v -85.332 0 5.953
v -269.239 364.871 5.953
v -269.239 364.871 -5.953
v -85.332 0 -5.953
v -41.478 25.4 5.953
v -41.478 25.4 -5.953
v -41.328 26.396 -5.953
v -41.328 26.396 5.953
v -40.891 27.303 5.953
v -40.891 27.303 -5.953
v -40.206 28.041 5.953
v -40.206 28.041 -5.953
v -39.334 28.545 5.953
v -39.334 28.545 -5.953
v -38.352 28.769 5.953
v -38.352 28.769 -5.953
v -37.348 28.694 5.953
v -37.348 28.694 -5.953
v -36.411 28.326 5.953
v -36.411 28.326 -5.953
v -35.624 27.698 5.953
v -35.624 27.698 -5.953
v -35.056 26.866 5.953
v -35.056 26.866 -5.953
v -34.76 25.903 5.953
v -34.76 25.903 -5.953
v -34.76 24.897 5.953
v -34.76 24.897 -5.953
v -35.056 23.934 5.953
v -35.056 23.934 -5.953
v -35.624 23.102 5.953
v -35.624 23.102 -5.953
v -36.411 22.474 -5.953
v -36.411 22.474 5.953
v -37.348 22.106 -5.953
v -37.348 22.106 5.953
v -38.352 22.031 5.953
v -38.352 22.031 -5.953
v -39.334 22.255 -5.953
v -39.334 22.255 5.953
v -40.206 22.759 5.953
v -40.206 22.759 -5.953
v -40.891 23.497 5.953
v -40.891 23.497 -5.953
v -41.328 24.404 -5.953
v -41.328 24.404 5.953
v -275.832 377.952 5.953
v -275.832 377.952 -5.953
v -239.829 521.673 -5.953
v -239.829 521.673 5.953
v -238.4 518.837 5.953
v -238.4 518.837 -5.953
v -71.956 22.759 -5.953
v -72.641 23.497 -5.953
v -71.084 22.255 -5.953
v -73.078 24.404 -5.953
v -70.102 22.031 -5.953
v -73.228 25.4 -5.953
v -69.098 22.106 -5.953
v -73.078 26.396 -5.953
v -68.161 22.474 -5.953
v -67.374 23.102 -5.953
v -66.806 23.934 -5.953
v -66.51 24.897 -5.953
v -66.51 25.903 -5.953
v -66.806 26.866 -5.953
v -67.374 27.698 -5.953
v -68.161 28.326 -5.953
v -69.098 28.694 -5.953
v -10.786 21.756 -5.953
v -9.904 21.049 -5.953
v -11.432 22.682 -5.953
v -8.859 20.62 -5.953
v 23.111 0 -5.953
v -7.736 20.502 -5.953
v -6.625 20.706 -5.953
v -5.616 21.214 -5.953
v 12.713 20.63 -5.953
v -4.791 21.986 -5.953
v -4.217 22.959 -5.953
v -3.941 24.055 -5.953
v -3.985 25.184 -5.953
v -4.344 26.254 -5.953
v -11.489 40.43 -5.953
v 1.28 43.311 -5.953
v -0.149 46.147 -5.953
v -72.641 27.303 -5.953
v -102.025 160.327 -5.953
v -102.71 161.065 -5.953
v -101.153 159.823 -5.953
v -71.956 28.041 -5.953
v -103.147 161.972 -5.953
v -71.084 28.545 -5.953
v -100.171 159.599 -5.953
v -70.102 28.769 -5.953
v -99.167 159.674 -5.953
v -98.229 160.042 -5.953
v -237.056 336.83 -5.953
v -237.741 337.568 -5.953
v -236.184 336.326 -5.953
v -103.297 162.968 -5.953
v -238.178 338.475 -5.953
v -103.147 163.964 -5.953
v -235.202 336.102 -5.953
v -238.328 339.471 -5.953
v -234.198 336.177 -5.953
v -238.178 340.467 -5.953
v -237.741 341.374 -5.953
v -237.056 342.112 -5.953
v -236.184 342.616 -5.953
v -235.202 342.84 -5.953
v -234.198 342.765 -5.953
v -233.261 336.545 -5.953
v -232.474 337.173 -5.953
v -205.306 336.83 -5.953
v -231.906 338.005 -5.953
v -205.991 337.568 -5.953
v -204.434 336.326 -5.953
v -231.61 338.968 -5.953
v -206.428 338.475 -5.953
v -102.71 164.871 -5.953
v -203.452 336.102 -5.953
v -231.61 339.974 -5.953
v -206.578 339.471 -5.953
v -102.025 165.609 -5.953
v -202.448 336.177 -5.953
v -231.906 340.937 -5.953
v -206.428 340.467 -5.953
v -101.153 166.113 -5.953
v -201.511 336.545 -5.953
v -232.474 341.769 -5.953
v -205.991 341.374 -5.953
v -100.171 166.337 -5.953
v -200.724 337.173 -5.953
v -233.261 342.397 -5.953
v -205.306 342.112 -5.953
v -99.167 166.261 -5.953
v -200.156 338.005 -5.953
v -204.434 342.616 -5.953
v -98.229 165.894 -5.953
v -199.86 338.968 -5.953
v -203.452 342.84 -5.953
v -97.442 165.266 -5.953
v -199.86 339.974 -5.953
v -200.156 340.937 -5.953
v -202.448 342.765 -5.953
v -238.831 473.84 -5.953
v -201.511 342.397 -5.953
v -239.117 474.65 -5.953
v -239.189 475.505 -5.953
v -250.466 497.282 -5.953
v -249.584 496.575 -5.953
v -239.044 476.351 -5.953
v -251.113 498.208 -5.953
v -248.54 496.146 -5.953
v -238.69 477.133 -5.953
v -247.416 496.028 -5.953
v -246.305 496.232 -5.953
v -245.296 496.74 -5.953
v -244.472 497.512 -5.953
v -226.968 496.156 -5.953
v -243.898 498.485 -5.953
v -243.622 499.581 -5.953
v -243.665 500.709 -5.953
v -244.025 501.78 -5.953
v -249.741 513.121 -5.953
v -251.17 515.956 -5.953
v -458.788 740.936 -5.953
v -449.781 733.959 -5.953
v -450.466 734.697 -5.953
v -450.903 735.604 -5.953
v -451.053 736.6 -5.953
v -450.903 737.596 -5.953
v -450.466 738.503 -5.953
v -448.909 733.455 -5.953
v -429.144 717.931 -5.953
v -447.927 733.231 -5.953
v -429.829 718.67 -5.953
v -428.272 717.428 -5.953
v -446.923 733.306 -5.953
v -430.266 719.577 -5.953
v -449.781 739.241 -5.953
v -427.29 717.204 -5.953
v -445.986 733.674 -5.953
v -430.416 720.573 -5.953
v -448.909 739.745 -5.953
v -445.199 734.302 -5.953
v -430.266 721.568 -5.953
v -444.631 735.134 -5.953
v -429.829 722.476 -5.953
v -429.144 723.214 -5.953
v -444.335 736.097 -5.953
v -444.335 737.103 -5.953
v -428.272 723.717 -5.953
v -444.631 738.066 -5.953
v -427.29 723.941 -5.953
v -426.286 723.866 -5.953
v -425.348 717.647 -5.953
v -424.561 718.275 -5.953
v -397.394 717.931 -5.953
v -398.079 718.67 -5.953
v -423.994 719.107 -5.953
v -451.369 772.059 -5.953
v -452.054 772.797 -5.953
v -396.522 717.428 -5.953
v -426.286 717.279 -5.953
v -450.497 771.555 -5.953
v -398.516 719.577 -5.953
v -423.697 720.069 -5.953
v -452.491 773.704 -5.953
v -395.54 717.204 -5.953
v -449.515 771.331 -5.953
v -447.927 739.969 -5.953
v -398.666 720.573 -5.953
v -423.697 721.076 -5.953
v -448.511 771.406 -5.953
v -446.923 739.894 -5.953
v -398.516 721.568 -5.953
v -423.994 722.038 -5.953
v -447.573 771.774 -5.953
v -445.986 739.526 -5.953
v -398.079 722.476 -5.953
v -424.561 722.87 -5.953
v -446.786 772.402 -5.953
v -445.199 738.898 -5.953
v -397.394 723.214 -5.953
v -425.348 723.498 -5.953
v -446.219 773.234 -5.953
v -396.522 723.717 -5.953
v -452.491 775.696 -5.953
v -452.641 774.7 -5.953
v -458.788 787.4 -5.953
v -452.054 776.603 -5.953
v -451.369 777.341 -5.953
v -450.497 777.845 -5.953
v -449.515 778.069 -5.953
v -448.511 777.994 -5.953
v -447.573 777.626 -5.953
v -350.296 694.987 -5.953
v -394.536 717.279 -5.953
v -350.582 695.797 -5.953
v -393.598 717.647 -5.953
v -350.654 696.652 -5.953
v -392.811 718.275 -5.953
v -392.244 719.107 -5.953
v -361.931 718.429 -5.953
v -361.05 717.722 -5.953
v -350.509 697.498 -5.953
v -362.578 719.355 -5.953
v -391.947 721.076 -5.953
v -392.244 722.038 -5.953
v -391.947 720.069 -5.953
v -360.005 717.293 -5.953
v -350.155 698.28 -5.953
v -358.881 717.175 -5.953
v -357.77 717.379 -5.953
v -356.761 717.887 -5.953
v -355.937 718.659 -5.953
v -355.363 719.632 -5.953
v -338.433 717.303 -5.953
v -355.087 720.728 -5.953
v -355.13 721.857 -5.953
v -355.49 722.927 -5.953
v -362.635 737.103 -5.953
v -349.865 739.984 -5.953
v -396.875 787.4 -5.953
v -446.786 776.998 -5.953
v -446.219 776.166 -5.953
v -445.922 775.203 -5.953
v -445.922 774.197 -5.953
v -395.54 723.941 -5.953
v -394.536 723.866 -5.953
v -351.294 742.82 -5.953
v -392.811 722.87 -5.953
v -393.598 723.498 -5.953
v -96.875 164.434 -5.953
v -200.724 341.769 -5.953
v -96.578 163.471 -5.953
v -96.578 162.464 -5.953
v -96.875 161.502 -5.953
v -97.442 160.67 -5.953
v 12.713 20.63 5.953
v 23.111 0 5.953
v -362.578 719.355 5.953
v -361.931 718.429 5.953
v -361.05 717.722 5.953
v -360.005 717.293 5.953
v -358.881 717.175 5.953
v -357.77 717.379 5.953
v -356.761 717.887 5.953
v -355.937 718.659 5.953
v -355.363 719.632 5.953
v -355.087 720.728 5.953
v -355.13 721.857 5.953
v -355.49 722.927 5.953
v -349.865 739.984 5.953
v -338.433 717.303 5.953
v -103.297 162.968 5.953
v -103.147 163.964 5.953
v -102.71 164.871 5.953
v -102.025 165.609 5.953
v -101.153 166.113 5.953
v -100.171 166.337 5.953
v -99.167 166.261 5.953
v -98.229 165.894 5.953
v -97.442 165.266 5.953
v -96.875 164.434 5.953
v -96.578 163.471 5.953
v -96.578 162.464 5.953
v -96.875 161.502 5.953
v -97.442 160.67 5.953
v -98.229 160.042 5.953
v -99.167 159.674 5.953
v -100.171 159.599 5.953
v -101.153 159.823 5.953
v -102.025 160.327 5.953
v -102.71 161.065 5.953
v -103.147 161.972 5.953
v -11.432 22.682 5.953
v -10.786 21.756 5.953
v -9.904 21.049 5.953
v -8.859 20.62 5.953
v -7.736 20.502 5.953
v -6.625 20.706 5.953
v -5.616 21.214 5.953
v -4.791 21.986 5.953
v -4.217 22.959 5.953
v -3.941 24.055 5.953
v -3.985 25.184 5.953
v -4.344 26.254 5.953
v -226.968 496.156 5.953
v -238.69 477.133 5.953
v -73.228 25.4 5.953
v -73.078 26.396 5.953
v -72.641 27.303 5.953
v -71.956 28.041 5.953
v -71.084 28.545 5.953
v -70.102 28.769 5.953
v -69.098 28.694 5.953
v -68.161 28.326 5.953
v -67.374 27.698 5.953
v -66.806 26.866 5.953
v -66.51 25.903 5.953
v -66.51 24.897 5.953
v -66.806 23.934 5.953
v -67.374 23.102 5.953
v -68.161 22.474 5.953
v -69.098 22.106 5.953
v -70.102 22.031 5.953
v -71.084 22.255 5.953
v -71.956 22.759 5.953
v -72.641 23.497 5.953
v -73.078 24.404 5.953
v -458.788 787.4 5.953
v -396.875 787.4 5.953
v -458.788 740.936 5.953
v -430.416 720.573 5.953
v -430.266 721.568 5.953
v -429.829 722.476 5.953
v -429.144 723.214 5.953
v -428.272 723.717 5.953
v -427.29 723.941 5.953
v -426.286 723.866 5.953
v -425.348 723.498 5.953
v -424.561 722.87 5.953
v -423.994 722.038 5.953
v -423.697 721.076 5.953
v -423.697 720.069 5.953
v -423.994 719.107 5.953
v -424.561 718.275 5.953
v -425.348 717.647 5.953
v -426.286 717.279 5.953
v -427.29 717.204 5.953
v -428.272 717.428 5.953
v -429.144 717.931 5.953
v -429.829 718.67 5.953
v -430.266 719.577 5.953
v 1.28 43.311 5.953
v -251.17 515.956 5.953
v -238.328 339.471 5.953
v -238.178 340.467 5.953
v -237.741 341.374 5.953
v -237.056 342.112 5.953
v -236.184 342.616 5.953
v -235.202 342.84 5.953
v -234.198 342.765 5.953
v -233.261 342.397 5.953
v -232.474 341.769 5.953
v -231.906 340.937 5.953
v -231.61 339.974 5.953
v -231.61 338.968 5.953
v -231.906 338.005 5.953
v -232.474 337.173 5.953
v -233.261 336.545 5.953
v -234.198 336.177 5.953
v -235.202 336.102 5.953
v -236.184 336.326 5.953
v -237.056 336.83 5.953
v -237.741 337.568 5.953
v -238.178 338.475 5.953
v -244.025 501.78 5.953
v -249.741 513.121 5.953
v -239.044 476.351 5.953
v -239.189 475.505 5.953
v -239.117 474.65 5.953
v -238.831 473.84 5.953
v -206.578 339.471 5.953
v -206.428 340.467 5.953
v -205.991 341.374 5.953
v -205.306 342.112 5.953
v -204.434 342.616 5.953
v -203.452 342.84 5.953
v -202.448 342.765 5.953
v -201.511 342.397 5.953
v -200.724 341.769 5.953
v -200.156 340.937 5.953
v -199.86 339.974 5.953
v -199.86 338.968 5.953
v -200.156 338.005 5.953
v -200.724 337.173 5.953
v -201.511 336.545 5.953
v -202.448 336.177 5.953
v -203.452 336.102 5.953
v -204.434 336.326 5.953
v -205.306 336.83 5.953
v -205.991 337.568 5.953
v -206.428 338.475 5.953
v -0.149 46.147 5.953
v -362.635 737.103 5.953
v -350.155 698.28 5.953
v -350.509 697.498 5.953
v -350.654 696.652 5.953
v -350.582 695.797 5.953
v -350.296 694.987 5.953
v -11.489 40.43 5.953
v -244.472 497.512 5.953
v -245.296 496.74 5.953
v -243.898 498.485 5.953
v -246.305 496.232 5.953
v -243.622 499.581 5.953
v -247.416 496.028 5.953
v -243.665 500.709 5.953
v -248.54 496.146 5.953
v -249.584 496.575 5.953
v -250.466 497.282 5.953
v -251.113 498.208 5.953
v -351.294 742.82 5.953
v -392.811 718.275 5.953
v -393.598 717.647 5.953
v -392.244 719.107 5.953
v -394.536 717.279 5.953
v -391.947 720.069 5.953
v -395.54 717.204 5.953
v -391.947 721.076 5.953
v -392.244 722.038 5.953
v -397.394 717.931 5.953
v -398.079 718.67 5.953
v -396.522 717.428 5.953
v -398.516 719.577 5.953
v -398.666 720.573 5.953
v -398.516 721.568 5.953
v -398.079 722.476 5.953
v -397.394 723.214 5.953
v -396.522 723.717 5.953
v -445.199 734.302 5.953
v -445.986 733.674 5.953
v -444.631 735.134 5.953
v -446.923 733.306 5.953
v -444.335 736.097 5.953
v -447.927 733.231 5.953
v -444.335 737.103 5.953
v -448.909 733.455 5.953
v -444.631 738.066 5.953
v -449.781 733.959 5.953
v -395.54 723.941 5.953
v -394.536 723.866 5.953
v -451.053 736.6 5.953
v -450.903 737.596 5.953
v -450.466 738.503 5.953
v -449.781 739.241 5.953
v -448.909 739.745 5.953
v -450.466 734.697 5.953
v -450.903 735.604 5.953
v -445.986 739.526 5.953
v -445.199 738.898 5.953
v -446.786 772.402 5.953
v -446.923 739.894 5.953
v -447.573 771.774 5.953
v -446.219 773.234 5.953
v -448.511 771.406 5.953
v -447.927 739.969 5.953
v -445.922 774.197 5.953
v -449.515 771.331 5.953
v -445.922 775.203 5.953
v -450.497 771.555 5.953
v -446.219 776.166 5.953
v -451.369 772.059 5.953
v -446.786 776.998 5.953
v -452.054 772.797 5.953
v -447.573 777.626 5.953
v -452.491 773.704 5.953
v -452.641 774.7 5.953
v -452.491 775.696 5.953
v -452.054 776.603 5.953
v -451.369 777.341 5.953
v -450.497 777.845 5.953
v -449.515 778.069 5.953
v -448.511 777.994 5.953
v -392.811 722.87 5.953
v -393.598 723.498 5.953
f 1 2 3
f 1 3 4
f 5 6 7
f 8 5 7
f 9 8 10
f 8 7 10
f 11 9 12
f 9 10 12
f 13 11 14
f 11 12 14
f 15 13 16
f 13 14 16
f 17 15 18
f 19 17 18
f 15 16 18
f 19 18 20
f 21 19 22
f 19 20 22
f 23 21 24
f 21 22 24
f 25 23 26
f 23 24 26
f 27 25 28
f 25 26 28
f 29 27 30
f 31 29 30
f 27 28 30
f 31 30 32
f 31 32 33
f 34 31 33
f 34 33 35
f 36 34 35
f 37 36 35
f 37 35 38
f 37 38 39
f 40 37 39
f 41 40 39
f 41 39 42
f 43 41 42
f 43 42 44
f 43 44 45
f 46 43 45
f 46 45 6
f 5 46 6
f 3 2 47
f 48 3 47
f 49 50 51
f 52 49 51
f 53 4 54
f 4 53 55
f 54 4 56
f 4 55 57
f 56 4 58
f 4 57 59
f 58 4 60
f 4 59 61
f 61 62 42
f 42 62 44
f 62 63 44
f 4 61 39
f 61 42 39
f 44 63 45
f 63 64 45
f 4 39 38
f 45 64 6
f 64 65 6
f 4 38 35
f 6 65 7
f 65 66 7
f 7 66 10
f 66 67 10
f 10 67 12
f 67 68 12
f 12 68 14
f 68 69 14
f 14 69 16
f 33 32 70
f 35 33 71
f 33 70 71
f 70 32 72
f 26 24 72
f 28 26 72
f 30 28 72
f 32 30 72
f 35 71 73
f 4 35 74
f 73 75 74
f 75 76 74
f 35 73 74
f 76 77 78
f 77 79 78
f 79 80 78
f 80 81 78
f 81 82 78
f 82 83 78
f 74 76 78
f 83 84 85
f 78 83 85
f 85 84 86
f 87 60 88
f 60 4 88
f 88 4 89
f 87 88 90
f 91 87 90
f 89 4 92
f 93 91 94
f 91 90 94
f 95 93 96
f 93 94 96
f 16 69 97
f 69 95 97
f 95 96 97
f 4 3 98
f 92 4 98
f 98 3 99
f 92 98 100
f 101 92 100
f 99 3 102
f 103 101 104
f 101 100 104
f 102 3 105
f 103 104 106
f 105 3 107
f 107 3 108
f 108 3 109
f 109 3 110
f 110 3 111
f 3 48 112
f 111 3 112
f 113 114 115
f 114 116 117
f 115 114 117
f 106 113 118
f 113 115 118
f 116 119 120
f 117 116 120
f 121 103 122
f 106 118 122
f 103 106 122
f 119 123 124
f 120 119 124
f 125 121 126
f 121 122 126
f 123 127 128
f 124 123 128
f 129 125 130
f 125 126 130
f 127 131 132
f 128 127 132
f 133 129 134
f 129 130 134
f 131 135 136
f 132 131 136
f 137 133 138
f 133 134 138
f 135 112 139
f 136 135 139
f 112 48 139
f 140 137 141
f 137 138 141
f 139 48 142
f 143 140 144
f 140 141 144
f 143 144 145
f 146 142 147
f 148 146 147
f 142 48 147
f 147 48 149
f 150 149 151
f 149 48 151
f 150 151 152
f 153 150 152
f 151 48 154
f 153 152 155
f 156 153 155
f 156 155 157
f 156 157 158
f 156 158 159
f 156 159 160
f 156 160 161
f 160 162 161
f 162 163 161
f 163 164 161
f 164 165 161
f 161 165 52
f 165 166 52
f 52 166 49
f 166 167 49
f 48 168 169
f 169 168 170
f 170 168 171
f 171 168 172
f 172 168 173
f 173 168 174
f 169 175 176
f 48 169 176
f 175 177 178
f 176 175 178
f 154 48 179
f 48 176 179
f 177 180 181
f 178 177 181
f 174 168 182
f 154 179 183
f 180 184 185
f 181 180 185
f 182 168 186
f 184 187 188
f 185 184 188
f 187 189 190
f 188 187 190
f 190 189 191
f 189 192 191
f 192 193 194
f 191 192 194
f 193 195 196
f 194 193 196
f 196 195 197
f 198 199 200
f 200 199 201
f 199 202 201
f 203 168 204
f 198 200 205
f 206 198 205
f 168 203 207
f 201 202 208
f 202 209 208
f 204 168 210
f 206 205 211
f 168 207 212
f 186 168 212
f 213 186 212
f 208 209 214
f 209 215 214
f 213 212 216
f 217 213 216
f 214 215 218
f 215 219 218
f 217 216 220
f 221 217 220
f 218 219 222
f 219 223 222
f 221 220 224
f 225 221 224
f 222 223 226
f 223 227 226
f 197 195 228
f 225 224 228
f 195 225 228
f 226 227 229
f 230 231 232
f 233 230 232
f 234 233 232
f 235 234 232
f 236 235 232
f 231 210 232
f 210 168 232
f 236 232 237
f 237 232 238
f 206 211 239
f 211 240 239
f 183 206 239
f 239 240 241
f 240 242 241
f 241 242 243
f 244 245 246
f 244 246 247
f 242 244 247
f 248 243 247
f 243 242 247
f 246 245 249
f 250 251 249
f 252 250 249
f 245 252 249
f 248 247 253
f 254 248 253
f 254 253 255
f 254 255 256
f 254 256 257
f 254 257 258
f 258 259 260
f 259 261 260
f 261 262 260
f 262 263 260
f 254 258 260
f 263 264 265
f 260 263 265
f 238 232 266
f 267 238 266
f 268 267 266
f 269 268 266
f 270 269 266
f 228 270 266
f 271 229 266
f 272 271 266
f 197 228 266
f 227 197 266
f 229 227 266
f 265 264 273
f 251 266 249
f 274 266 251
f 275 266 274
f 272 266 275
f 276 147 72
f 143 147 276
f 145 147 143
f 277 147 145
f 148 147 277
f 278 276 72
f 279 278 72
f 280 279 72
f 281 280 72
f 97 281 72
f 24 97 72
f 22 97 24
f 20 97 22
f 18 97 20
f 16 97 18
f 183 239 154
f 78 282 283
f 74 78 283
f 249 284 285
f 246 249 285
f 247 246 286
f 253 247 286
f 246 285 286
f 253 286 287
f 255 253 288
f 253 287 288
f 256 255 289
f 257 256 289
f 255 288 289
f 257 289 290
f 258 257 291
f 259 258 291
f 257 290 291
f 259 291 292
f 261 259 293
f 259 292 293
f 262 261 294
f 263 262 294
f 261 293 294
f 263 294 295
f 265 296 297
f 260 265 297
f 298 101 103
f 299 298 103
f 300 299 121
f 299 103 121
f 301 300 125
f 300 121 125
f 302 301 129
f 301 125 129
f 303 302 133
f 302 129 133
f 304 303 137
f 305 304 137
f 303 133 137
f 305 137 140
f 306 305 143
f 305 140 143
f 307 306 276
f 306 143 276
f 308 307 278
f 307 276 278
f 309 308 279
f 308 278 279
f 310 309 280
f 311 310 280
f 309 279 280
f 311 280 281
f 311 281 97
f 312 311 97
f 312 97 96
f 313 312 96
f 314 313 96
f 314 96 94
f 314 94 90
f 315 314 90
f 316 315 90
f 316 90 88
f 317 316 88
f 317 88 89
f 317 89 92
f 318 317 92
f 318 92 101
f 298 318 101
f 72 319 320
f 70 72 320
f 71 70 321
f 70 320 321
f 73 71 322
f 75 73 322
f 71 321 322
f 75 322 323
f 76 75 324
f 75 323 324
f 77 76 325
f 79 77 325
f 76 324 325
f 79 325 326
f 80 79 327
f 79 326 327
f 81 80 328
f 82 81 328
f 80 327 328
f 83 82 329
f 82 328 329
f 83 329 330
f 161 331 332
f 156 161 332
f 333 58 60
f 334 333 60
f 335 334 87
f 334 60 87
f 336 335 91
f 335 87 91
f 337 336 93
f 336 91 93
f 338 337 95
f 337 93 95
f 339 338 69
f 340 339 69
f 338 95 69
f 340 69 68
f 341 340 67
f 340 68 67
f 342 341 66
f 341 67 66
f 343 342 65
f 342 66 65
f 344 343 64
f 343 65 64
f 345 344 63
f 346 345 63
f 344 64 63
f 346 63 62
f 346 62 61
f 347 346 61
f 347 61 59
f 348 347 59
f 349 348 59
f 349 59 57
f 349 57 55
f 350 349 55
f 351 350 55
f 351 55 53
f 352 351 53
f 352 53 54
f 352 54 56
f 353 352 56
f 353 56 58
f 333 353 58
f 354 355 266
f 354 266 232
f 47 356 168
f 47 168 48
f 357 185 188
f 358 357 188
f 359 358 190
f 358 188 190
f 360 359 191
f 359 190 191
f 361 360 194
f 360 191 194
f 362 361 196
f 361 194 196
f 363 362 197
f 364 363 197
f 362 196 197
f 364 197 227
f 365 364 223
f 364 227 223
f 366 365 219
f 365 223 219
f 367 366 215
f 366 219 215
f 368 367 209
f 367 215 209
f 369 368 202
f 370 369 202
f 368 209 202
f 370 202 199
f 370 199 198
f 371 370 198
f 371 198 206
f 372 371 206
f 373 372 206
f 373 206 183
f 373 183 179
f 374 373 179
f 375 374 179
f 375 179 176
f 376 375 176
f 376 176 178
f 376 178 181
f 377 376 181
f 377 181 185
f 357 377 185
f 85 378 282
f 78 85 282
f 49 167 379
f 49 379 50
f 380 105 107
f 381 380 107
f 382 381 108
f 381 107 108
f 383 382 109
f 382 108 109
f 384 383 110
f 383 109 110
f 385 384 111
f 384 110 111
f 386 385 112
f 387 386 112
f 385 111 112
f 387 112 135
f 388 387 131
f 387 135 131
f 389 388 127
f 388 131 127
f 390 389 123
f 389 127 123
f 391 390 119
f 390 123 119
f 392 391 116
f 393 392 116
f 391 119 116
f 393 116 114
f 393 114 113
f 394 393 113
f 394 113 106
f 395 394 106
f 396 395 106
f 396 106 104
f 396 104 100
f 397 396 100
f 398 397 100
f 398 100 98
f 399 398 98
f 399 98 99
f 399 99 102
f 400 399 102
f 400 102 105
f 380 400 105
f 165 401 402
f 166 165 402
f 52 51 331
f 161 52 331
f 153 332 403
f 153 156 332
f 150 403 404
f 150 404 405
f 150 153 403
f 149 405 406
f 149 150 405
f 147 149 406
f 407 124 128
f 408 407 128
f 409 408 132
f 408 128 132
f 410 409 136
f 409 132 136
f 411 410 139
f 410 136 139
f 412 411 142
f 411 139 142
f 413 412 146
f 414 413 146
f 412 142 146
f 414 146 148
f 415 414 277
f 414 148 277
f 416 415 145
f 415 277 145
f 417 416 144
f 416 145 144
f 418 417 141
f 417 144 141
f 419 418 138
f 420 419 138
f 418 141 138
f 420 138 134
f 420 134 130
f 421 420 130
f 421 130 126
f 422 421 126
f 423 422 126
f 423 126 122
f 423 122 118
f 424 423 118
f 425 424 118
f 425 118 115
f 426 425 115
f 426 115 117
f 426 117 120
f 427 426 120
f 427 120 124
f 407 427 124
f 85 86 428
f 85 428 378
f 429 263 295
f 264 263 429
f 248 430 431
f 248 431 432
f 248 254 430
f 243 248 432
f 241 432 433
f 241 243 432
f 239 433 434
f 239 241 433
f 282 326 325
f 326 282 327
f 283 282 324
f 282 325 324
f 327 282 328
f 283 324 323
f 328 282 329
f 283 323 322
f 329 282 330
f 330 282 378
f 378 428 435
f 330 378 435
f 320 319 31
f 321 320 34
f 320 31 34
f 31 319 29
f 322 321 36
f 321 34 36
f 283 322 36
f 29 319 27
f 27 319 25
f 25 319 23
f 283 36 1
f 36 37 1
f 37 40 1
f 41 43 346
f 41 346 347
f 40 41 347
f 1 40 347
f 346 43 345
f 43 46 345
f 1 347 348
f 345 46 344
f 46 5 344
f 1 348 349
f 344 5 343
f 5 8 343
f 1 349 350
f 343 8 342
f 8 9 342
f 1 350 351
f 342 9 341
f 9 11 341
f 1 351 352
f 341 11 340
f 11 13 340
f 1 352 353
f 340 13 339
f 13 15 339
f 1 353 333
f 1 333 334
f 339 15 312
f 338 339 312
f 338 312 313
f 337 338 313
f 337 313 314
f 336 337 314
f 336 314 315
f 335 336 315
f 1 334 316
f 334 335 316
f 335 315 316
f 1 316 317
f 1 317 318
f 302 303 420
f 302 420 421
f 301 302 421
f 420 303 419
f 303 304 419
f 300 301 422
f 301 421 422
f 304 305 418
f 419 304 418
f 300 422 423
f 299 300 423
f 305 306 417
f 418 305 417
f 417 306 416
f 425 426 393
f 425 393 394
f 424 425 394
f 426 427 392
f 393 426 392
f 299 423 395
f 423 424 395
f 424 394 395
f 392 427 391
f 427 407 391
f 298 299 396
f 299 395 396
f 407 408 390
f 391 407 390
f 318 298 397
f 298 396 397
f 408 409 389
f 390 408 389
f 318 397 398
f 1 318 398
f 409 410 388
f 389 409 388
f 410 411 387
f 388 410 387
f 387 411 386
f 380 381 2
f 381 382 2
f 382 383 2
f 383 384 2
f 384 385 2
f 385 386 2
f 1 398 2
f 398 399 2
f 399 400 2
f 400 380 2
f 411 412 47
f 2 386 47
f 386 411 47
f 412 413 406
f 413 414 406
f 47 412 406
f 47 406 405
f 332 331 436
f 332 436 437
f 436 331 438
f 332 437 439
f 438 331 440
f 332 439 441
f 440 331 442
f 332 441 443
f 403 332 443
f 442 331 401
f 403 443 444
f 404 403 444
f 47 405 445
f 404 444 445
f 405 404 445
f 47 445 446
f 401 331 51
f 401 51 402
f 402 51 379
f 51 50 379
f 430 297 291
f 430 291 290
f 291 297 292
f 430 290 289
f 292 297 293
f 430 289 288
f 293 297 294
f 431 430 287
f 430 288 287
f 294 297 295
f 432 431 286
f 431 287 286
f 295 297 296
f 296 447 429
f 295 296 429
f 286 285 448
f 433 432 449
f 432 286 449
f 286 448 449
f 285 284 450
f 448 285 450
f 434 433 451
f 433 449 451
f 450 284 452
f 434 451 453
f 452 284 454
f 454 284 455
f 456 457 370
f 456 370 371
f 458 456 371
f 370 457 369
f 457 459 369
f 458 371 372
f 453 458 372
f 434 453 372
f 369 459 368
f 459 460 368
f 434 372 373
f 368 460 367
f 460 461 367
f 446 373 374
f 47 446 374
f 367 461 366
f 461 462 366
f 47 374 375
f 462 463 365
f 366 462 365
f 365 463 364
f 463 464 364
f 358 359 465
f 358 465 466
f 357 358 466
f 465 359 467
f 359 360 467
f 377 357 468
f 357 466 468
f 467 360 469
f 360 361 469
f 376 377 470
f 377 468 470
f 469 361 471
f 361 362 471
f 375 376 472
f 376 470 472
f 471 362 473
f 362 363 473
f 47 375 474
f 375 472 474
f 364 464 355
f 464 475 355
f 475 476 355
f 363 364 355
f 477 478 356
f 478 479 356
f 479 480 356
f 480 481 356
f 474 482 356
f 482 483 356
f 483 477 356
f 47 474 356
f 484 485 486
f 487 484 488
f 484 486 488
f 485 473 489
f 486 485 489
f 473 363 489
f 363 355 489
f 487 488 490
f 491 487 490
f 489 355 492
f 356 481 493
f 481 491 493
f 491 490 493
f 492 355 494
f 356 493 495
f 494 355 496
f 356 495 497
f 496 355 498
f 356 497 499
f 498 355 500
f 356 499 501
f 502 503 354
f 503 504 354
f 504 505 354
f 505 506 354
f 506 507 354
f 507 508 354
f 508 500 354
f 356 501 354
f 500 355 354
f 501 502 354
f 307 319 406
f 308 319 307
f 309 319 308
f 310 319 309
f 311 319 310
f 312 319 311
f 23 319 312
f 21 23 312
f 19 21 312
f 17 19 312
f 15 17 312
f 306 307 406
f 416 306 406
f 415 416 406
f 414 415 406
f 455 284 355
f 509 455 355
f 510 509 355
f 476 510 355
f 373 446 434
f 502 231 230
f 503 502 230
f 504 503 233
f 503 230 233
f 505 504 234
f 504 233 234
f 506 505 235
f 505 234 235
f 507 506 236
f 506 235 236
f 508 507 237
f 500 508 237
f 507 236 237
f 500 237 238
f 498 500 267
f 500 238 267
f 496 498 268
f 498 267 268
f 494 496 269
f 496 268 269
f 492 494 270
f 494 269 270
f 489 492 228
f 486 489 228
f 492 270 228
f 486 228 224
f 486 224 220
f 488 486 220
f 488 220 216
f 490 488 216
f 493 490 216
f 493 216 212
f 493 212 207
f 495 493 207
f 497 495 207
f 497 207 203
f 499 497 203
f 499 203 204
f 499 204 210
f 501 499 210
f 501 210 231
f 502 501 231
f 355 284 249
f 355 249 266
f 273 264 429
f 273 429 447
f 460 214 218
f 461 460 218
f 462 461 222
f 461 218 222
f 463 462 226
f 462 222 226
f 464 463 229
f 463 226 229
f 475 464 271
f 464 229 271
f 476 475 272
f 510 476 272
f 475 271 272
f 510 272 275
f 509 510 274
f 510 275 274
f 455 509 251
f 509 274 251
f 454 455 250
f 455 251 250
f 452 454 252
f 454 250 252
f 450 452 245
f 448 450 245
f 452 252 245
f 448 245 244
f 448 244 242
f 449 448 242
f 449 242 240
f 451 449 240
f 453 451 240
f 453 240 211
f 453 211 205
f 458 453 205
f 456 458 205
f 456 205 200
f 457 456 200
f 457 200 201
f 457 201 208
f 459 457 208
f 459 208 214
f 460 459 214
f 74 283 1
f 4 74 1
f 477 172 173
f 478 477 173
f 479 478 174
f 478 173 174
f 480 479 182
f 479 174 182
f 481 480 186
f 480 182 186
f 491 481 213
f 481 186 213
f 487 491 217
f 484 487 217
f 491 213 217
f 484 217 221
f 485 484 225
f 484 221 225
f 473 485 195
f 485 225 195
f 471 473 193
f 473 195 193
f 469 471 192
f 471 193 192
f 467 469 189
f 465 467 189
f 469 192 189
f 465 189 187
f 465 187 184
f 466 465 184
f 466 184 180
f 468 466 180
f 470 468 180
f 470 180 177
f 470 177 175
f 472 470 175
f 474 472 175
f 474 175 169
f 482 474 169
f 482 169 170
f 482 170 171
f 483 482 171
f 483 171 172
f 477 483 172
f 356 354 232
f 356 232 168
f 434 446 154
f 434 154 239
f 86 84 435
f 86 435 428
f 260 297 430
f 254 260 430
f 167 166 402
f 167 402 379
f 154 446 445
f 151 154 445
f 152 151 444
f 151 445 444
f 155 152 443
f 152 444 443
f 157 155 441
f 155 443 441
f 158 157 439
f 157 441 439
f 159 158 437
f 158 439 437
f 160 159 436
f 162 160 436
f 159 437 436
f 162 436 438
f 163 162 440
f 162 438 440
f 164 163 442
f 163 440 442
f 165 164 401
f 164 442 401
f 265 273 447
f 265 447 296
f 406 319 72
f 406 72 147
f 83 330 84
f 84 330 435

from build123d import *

# Parameters (mm, degrees)
BOSS_EXTRUDE1_DEPTH     = 5.953125
SKETCH3_W               = 47.23204247
SKETCH3_H               = 13.081
CUT_EXTRUDE1_DEPTH      = 924.398153884
BOSS_EXTRUDE3_DEPTH     = 11.90625
F_1_4_CLEARANCE_HOLE1_D = 6.7564
SKETCH13_W              = 23.41954247
SKETCH13_H              = 28.3464
CUT_EXTRUDE2_DEPTH      = 924.398153884
SKETCH14_R              = 3.429
CUT_EXTRUDE3_DEPTH      = 913.667776704
F_1_4_CLEARANCE_HOLE2_D = 6.7564
CUT_EXTRUDE4_DEPTH      = 913.667776704
BOSS_EXTRUDE4_START     = -11.90625
BOSS_EXTRUDE4_DEPTH     = 11.90625
BOSS_EXTRUDE5_DEPTH     = 11.90625
CUT_EXTRUDE5_DEPTH      = 912.387123535
FILLET1_R               = 3.3782


with BuildPart() as part:
    # Sketch1 → Boss-Extrude1 (new, symmetric)
    with BuildSketch(Plane.XY):
        Polygon((0, 0), (-396.875, 787.4), (-482.20704247, 787.4), (-85.33204247, 0), align=None)
    extrude(amount=BOSS_EXTRUDE1_DEPTH, both=True)

    # Sketch3 → Cut-Extrude1 (cut, through all)
    with BuildSketch(Plane.XY.offset(5.953125)):
        with Locations((-252.216021235, 371.4115)):
            Rectangle(SKETCH3_W, SKETCH3_H)
        with Locations((-444.303521235, 752.5131)):
            Rectangle(SKETCH3_W, SKETCH3_H)
    extrude(amount=-CUT_EXTRUDE1_DEPTH, mode=Mode.SUBTRACT)

    # Sketch10 → Boss-Extrude3 (add)
    with BuildSketch(Plane.XY.offset(5.953125)):
        with BuildLine():
            Line((-244.024703128, 501.780299783), (-249.740869802, 513.121174464))
            ThreePointArc((-249.740869802, 513.121174464), (-246.928515798, 521.649695143), (-238.39999512, 518.837341139))
            Line((-238.39999512, 518.837341139), (-226.967661771, 496.155591775))
            Line((-226.967661771, 496.155591775), (-239.680416455, 475.525946247))
            Line((-239.680416455, 475.525946247), (-251.112749804, 498.207695611))
            ThreePointArc((-251.112749804, 498.207695611), (-245.78242438, 496.449974359), (-244.024703128, 501.780299783))
        make_face()
        with BuildLine():
            Line((-351.145666605, 696.673002545), (-362.577999954, 719.354751908))
            ThreePointArc((-362.577999954, 719.354751908), (-357.24767453, 717.597030656), (-355.489953278, 722.92735608))
            Line((-355.489953278, 722.92735608), (-361.206119952, 734.268230762))
            ThreePointArc((-361.206119952, 734.268230762), (-358.393765948, 742.79675144), (-349.86524527, 739.984397436))
            Line((-349.86524527, 739.984397436), (-338.432911921, 717.302648072))
            Line((-338.432911921, 717.302648072), (-351.145666605, 696.673002545))
        make_face()
        with BuildLine():
            Line((0, 0), (-11.432333349, 22.681749364))
            ThreePointArc((-11.432333349, 22.681749364), (-6.102007925, 20.924028111), (-4.344286673, 26.254353535))
            Line((-4.344286673, 26.254353535), (-10.060453347, 37.595228217))
            ThreePointArc((-10.060453347, 37.595228217), (-7.248099343, 46.123748895), (1.280421335, 43.311394892))
            Line((1.280421335, 43.311394892), (12.712754684, 20.629645528))
            Line((12.712754684, 20.629645528), (23.110761502, 0))
            Line((23.110761502, 0), (0, 0))
        make_face()
    extrude(amount=-BOSS_EXTRUDE3_DEPTH)

    # 1/4 Clearance Hole1 (through all)
    with Locations(Plane.XY.offset(5.953125)):
        with Locations((-99.918593468, 162.967911886), (-427.0375, 720.5726), (-395.2875, 720.5726), (-203.2, 339.471), (-234.95, 339.471), (-69.85, 25.4), (-38.1, 25.4)):
            Hole(F_1_4_CLEARANCE_HOLE1_D / 2)

    # Sketch13 → Cut-Extrude2 (cut, through all)
    with BuildSketch(Plane.XY.offset(5.953125)):
        with Locations((-470.497271235, 773.2268)):
            Rectangle(SKETCH13_W, SKETCH13_H)
    extrude(amount=-CUT_EXTRUDE2_DEPTH, mode=Mode.SUBTRACT)

    # Sketch14 → Cut-Extrude3 (cut, through all)
    with BuildSketch(Plane.XY.offset(5.953125)):
        with Locations((-424.1165, 759.0536)):
            Circle(SKETCH14_R)
        with Locations((-424.1165, 745.9726)):
            Circle(SKETCH14_R)
        with Locations((-232.029, 377.952)):
            Circle(SKETCH14_R)
        with Locations((-232.029, 364.871)):
            Circle(SKETCH14_R)
    extrude(amount=-CUT_EXTRUDE3_DEPTH, mode=Mode.SUBTRACT)

    # 1/4 Clearance Hole2 (through all)
    with Locations(Plane.XY.offset(5.953125)):
        with Locations((-447.675, 736.6), (-449.2625, 774.7)):
            Hole(F_1_4_CLEARANCE_HOLE2_D / 2)

    # Sketch18 → Cut-Extrude4 (cut, through all)
    with BuildSketch(Plane.XY.offset(5.953125)):
        Polygon((-458.7875, 745.9726), (-458.7875, 740.93562774), (-461.326296502, 745.9726), align=None)
    extrude(amount=-CUT_EXTRUDE4_DEPTH, mode=Mode.SUBTRACT)

    # Sketch19 → Boss-Extrude4 (add)
    with BuildSketch(Plane(origin=(0, 0, -5.953125), x_dir=(-1, 0, 0), z_dir=(0, 0, -1)).offset(BOSS_EXTRUDE4_START)):
        with BuildLine():
            Line((458.7875, 759.0536), (458.7875, 745.9726))
            Line((458.7875, 745.9726), (427.5455, 745.9726))
            ThreePointArc((427.5455, 745.9726), (424.1165, 742.5436), (420.6875, 745.9726))
            Line((420.6875, 745.9726), (420.6875, 759.0536))
            ThreePointArc((420.6875, 759.0536), (424.1165, 762.4826), (427.5455, 759.0536))
            Line((427.5455, 759.0536), (458.7875, 759.0536))
        make_face()
        with BuildLine():
            Line((269.238796502, 364.871), (275.83204247, 377.952))
            Line((275.83204247, 377.952), (235.458, 377.952))
            ThreePointArc((235.458, 377.952), (232.029, 381.381), (228.6, 377.952))
            Line((228.6, 377.952), (228.6, 364.871))
            ThreePointArc((228.6, 364.871), (232.029, 361.442), (235.458, 364.871))
            Line((235.458, 364.871), (269.238796502, 364.871))
        make_face()
    extrude(amount=BOSS_EXTRUDE4_DEPTH)

    # Sketch20 → Boss-Extrude5 (add)
    with BuildSketch(Plane(origin=(0, 0, -5.953125), x_dir=(-1, 0, 0), z_dir=(0, 0, -1))):
        Polygon((349.86524527, 739.984397436), (361.206119952, 734.268230762), (364.064203289, 739.938668103), (352.723328607, 745.654834777), align=None)
        Polygon((238.39999512, 518.837341139), (249.740869802, 513.121174464), (252.598953139, 518.791611805), (241.258078457, 524.50777848), align=None)
        Polygon((-1.280421335, 43.311394892), (10.060453347, 37.595228217), (12.918536684, 43.265665558), (1.577662002, 48.981832233), align=None)
    extrude(amount=-BOSS_EXTRUDE5_DEPTH)

    # Sketch21 → Cut-Extrude5 (cut, through all)
    with BuildSketch(Plane(origin=(0, 0, -5.953125), x_dir=(-1, 0, 0), z_dir=(0, 0, -1))):
        Polygon((352.723328607, 745.654834777), (364.064203289, 739.938668103), (362.635161621, 737.103449432), (351.294286939, 742.819616107), align=None)
        Polygon((241.258078457, 524.50777848), (252.598953139, 518.791611805), (251.169911471, 515.956393135), (239.829036789, 521.672559809), align=None)
        Polygon((1.577662002, 48.981832233), (12.918536684, 43.265665558), (11.489495015, 40.430446888), (0.148620334, 46.146613562), align=None)
    extrude(amount=-CUT_EXTRUDE5_DEPTH, mode=Mode.SUBTRACT)

    # Fillet1
    fillet1_edges = [part.edges().sort_by_distance(p)[0] for p in [
        (-239.680416455, 475.525946247, 0),
        (-351.145666605, 696.673002545, 0),
    ]]
    fillet(fillet1_edges, radius=FILLET1_R)


solid = part.part
